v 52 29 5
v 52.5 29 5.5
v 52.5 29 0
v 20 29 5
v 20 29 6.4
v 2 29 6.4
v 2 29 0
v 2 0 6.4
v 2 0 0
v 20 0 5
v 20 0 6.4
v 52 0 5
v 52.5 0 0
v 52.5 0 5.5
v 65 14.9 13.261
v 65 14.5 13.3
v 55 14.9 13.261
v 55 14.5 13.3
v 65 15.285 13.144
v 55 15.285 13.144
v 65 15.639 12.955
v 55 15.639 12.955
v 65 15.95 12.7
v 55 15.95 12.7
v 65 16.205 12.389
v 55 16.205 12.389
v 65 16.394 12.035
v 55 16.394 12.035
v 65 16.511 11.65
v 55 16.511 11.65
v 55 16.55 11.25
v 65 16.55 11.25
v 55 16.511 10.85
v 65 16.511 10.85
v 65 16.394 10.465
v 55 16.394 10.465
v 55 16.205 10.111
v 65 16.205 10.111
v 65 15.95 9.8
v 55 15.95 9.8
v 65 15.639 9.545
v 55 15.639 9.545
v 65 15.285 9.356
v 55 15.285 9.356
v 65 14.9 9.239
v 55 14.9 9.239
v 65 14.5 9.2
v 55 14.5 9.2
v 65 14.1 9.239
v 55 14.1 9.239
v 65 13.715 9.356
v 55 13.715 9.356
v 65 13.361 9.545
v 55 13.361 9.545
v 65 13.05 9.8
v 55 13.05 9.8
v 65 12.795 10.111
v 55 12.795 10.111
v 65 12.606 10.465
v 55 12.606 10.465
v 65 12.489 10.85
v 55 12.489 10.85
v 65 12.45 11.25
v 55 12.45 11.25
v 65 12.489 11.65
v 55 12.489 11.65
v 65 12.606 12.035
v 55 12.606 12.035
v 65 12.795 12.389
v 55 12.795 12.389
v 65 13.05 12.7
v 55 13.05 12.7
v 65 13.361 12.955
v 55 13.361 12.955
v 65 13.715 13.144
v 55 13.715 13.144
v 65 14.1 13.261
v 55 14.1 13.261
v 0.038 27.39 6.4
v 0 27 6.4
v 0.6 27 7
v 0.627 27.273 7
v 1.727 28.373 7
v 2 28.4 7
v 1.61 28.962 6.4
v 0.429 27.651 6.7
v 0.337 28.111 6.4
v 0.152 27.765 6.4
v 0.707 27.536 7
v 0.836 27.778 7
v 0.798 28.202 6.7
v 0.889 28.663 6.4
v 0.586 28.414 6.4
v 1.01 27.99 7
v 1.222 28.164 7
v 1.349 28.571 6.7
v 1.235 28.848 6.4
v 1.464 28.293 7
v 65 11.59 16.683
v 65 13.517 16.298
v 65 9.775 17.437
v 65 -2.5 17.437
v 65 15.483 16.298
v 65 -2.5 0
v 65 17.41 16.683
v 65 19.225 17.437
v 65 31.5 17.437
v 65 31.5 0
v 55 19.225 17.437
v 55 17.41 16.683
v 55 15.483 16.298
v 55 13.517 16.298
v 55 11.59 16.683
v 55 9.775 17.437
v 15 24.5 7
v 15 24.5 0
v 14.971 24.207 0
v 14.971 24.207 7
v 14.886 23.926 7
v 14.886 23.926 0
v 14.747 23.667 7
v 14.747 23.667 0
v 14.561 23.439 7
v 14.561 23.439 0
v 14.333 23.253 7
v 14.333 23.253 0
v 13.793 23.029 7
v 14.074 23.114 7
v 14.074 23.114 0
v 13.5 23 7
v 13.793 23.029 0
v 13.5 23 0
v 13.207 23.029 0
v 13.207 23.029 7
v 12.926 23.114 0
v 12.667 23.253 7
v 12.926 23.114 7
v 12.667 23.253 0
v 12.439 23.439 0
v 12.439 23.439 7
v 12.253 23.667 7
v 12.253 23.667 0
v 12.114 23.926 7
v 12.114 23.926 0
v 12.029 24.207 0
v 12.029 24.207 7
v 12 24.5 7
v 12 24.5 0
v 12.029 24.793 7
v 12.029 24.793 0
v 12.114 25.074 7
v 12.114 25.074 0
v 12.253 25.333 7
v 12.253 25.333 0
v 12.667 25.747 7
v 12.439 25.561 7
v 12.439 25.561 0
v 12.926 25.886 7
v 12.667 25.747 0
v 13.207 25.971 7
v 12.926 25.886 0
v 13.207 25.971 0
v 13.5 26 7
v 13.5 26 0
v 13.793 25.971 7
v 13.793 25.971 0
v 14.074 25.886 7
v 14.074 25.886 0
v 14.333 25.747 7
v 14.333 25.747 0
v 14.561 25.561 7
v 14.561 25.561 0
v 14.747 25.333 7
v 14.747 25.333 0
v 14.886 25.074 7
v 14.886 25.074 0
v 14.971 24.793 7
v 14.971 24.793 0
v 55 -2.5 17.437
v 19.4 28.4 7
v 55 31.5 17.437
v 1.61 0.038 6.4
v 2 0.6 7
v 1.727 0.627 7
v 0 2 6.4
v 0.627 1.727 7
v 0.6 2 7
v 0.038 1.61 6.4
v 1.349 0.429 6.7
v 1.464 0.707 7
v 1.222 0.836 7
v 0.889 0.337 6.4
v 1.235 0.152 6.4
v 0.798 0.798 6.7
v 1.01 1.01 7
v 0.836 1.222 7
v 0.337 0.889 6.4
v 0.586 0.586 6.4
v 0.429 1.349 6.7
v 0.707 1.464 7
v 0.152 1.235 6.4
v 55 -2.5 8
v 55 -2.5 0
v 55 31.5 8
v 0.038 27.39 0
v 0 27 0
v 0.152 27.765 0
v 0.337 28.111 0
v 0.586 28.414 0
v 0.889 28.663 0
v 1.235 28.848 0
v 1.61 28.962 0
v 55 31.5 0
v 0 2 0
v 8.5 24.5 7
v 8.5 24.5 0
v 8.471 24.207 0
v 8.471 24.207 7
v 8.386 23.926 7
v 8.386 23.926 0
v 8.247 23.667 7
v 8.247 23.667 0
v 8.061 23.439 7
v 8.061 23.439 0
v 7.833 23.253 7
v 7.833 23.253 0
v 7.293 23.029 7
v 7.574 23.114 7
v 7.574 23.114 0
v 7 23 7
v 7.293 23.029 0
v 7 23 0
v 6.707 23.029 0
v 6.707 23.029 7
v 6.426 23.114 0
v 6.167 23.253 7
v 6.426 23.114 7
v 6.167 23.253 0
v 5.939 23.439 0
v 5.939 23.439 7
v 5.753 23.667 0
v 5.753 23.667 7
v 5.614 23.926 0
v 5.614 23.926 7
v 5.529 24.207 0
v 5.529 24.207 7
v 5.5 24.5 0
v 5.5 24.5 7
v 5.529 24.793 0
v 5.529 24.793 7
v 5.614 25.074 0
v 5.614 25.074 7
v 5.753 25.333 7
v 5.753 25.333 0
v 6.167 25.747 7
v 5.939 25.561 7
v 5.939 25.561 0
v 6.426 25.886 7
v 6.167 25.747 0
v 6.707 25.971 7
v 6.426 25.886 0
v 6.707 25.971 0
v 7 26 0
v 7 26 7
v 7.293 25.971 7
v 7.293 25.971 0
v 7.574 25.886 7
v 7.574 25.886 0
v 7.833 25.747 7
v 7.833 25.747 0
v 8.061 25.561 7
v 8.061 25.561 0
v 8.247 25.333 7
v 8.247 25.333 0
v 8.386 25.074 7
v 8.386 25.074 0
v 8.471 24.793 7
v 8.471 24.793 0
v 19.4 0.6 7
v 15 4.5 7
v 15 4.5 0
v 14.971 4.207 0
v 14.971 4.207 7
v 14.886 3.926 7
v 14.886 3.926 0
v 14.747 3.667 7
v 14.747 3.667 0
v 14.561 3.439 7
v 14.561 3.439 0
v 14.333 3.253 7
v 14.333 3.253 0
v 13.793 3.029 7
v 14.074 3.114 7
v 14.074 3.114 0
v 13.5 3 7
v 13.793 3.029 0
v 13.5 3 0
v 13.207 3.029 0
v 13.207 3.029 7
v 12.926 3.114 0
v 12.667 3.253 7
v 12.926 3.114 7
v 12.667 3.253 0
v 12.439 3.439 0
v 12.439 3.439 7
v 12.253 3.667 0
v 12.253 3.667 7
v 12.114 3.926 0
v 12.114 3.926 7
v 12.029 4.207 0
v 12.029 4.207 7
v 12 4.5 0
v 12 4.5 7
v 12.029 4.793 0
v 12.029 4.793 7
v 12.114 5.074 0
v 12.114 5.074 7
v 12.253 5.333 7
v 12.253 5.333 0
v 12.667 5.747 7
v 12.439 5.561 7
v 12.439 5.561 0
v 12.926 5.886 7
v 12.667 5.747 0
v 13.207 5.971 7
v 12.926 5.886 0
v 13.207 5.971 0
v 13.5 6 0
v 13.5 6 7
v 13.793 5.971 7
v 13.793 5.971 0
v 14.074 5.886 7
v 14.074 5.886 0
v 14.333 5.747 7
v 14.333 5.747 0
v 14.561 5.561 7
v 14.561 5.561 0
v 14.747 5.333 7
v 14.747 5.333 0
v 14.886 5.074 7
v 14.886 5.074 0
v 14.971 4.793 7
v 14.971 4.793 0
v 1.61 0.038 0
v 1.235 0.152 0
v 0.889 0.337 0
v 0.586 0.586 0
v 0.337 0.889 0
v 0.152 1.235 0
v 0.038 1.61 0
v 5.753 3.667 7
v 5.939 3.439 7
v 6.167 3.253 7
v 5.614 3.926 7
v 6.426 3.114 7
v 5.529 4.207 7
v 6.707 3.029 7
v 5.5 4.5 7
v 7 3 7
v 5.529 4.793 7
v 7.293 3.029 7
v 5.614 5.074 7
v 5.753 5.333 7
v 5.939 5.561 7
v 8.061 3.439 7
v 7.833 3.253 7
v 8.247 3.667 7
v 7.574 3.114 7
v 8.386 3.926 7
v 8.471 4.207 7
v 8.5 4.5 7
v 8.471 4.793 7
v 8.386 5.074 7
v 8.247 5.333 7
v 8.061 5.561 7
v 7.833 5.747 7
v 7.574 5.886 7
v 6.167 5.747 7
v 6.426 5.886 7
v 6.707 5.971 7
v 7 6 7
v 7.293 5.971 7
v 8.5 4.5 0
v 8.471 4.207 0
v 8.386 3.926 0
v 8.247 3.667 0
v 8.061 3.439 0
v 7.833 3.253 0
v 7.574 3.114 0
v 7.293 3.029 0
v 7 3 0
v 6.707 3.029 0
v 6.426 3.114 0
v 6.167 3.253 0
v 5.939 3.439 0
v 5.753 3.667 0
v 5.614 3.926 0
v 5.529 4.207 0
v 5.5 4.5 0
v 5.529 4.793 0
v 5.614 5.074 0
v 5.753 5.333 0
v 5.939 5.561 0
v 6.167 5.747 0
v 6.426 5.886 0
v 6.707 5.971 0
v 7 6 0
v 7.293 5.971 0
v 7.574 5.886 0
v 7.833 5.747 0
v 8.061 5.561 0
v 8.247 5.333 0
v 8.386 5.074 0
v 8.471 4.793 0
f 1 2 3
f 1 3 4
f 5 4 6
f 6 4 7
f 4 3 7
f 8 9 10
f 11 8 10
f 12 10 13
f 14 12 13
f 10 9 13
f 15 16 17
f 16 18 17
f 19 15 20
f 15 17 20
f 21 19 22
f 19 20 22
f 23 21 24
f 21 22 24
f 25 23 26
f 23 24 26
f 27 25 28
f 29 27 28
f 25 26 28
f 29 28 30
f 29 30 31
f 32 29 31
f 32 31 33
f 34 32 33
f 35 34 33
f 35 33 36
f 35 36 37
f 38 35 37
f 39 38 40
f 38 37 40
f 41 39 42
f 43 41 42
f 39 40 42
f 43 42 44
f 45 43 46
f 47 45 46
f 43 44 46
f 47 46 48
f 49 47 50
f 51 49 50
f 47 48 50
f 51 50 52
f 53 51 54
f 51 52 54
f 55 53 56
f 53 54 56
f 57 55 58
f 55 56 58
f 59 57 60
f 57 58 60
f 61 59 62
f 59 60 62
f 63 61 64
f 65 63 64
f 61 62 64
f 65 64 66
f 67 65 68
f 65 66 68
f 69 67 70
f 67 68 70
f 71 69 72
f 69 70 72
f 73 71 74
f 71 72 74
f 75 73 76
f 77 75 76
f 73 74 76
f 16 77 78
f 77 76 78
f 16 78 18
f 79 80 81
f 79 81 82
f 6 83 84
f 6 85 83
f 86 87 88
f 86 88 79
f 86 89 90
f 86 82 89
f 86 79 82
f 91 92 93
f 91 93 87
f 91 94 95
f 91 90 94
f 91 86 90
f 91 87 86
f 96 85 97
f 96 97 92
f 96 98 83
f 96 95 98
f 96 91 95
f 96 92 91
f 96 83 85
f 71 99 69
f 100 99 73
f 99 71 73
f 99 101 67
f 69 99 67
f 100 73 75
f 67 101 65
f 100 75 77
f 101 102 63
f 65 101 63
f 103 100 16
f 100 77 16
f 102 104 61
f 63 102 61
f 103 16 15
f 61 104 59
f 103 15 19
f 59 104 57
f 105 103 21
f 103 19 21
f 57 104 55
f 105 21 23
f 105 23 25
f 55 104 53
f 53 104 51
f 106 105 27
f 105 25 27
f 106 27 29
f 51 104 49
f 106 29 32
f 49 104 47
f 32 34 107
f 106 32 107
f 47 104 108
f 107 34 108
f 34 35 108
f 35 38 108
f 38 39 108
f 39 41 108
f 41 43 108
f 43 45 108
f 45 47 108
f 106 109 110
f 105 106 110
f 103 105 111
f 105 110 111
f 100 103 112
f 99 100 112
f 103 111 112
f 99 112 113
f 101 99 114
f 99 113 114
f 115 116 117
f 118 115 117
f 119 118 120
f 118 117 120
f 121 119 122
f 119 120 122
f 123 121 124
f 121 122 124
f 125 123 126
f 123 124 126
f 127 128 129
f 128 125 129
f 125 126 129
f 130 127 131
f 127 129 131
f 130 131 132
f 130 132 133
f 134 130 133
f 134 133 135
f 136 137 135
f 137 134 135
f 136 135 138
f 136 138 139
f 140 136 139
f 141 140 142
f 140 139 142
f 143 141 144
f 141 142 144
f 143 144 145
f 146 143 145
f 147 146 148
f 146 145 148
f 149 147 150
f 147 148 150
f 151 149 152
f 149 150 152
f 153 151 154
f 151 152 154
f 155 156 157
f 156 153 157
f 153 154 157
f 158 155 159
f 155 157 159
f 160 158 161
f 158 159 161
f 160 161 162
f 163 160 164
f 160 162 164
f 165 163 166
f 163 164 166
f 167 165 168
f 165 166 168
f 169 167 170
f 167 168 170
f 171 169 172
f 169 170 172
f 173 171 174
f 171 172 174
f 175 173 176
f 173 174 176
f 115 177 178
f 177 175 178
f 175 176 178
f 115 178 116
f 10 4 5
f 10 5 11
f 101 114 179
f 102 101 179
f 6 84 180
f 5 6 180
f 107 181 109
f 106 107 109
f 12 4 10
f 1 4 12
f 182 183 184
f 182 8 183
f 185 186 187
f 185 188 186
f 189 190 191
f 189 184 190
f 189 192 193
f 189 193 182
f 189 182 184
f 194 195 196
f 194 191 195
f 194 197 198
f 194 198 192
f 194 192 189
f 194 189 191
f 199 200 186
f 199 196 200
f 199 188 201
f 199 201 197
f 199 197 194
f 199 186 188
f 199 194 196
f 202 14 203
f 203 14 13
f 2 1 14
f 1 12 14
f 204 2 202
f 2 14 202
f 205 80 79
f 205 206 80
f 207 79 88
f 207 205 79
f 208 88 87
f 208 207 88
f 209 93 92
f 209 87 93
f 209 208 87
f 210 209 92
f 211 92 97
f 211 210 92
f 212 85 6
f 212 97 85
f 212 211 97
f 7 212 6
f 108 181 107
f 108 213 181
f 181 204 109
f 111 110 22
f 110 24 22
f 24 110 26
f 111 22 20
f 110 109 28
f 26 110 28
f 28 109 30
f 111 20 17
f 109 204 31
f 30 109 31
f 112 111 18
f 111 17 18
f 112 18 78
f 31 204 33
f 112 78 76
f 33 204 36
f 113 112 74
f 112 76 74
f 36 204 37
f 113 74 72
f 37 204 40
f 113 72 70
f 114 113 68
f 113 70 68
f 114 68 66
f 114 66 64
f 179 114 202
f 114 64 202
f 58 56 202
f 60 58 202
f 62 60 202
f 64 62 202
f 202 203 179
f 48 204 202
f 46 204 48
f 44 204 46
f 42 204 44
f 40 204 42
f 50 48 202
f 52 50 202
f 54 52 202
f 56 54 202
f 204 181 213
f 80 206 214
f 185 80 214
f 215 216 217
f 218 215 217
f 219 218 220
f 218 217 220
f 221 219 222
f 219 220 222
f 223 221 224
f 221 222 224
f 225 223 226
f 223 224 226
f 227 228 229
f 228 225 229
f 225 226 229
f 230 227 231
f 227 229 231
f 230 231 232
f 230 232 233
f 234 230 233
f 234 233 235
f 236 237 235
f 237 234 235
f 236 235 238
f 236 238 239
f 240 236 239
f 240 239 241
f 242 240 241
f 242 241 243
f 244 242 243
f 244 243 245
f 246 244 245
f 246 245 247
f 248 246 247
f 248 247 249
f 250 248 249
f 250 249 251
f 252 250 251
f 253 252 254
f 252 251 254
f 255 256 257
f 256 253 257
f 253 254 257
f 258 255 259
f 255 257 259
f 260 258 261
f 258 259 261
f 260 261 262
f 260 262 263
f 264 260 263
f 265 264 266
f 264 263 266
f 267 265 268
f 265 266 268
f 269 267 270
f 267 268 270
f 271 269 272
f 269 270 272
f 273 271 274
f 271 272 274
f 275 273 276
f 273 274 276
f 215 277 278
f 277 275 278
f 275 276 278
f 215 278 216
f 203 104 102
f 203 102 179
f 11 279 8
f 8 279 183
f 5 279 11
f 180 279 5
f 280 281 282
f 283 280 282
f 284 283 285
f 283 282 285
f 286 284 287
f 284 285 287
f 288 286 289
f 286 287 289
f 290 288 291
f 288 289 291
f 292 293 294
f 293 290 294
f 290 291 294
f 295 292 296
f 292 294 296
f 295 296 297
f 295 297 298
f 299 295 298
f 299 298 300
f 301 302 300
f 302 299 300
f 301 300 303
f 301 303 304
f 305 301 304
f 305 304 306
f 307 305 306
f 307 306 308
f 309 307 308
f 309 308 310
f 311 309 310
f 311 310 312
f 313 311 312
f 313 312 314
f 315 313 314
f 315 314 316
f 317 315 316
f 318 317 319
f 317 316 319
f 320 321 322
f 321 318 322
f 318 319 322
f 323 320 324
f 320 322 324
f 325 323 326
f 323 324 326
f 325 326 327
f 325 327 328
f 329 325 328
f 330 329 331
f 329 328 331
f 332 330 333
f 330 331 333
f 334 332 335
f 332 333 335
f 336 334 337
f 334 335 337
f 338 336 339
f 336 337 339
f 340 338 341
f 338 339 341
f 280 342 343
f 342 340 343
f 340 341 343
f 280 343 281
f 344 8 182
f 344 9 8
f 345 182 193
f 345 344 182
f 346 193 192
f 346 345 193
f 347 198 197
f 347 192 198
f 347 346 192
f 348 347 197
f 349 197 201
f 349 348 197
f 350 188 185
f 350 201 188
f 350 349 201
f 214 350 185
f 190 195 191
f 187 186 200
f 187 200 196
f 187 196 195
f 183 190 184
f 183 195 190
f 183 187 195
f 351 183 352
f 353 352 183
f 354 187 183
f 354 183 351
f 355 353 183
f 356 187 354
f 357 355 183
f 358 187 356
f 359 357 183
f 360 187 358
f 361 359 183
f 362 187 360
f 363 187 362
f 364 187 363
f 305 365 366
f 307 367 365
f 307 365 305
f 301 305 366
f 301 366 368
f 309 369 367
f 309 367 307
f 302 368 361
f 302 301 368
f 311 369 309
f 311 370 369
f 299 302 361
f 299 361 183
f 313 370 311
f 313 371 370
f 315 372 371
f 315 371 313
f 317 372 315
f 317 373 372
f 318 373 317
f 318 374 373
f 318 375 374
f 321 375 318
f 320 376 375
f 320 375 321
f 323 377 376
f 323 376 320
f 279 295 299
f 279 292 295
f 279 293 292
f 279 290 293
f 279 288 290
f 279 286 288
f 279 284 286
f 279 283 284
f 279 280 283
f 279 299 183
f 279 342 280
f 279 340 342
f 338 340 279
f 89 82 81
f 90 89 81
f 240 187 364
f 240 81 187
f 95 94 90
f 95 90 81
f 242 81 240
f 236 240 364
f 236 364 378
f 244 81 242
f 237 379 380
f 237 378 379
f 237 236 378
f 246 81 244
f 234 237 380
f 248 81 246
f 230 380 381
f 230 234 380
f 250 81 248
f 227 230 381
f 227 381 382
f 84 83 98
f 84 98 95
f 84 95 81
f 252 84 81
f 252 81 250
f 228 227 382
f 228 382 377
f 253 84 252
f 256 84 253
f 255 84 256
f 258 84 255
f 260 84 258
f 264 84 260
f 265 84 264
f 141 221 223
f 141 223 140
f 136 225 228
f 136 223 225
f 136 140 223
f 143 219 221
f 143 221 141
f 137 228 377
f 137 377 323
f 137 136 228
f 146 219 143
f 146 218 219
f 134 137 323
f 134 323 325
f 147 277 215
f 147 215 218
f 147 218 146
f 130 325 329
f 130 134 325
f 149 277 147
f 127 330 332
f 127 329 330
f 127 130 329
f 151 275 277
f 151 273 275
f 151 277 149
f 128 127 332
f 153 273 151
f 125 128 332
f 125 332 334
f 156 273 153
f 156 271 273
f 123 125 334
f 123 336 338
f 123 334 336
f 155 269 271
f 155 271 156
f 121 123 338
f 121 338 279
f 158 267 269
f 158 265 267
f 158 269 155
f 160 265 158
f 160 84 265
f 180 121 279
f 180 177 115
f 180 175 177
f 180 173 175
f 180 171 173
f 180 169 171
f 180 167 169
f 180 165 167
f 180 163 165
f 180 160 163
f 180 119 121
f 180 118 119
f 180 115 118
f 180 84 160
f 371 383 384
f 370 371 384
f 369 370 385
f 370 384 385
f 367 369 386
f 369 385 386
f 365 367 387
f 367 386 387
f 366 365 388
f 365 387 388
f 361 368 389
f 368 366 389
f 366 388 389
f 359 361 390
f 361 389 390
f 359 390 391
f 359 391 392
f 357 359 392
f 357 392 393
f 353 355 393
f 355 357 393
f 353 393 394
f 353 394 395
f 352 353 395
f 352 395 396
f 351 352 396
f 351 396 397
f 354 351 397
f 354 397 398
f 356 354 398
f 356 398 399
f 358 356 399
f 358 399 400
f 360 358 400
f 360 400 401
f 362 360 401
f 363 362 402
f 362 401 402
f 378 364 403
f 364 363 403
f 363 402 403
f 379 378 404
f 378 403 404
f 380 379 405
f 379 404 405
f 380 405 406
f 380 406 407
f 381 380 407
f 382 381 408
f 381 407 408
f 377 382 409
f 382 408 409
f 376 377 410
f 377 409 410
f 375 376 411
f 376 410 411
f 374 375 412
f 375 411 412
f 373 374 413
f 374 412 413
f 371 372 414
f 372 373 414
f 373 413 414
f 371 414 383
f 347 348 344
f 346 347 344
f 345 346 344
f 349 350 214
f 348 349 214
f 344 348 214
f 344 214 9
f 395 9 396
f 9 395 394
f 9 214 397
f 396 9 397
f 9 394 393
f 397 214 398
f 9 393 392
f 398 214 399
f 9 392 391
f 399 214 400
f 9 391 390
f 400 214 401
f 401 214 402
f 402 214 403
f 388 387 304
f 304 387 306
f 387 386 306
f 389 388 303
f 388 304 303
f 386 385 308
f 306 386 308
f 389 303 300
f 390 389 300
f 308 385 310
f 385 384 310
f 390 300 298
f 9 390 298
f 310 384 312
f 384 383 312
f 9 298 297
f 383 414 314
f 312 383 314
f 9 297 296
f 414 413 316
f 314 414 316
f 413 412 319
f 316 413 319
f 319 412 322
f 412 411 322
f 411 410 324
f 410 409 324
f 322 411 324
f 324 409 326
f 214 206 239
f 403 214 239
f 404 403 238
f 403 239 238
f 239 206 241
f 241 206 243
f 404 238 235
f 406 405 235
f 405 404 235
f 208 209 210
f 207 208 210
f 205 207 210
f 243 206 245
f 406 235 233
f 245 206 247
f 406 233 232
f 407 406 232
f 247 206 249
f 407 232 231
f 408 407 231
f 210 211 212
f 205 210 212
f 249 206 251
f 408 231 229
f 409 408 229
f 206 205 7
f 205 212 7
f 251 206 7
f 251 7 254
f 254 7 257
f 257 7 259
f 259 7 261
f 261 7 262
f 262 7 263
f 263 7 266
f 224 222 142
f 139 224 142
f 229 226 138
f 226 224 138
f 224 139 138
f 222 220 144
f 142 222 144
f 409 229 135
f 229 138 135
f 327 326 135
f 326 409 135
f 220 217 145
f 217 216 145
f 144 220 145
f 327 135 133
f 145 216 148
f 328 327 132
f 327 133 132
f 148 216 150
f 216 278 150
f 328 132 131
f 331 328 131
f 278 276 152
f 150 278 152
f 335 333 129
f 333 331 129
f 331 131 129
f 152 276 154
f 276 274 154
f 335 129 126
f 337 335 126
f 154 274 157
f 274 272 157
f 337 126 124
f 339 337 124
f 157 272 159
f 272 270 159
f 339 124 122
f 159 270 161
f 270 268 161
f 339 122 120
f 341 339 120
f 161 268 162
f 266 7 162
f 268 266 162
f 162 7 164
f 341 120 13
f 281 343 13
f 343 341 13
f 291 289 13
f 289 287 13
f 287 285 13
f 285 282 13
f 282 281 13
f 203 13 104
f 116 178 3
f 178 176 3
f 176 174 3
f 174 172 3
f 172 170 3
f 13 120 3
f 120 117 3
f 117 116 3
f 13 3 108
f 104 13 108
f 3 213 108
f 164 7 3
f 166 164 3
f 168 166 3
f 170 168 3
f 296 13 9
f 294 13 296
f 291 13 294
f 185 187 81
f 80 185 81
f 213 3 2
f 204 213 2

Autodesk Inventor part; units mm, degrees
ref_plane "YZ Plane" through (0, 0, 0) normal (1, 0, 0) x (0, 1, 0)
ref_plane "XZ Plane" through (0, 0, 0) normal (0, 1, 0) x (-1, 0, 0)
ref_plane "XY Plane" through (0, 0, 0) normal (0, 0, 1) x (1, 0, 0)
sketch "Sketch1" plane through (0, 0, 0) normal (0, 0, 1) x (1, 0, 0)
  line L0 (2, 0) -> (65, 0)
  line L1 (65, 0) -> (65, 29)
  line L2 (65, 29) -> (2, 29)
  line L3 (0, 27) -> (0, 2)
  arc A0 (2, 29) -> (0, 27) centre (2, 27) ccw
  arc A1 (0, 2) -> (2, 0) centre (2, 2) ccw
  line L4 (20, 29) -> (20, 0)
  line L5 (55, 29) -> (55, 0)
  circle A2 centre (7, 24.5) radius 1.5
  circle A3 centre (7, 4.5) radius 1.5
  circle A4 centre (13.5, 24.5) radius 1.5
  circle A5 centre (13.5, 4.5) radius 1.5
  line L6 (65, 0) -> (65, -2.5)
  line L7 (65, -2.5) -> (55, -2.5)
  line L8 (55, -2.5) -> (55, 0)
  line L9 (55, 29) -> (55, 31.5)
  line L10 (55, 31.5) -> (65, 31.5)
  line L11 (65, 31.5) -> (65, 29)
  point P0 (0, 0)
  point P1 (0, 29)
  dimension "d0" = 65
  dimension "d1" = 29
  dimension "d2" = 2
  dimension "d3" = 20
  dimension "d4" = 10
  dimension "d5" = 3
  dimension "d6" = 3
  dimension "d7" = 4.5
  dimension "d8" = 4.5
  dimension "d9" = 20
  dimension "d10" = 3
  dimension "d11" = 3
  dimension "d12" = 20
  dimension "d13" = 6.5
  dimension "d14" = 7
  dimension "d24" = 2.5
  dimension "d25" = 2.5
extrude "Extrusion1" add sketch "Sketch1" along normal blind 5 contours L4 L2 L5 L0
extrude "Extrusion2" add sketch "Sketch1" along normal blind 7 contours A1 L3 A0 L2 L4 L0
extrude "Extrusion3" add sketch "Sketch1" along normal blind 26.25 contours L5 L2 L1 L0
sketch "Sketch2" plane through (55, 0, 5) normal (-1, 0, 0) x (0, 0, 1)
  line L0 (21.25, 29) -> (21.25, 0) projected
  circle A0 centre (21.25, 14.5) radius 10
  point P0 (-5, 0)
  point P1 (21.25, 4.5)
  point P2 (21.25, 24.5)
  dimension "d21" = 20
extrude "Extrusion4" cut sketch "Sketch2" against normal blind 20 contours L0 A0 picked at (15.0351, 13.318)
extrude "Extrusion5" add sketch "Sketch1" along normal blind 26.25 contours L0 L6 L7 L8 | L9 L10 L11 L2
chamfer "Chamfer1" distance 2.5 angle 45 1 edges at (55, 0, 2.5)
chamfer "Chamfer2" distance 2.5 angle 45 1 edges at (55, 29, 2.5)
chamfer "Chamfer4" distance 0.6 angle 45 6 edges at (20, 14.5, 7) (11, 0, 7) (0.5858, 0.5858, 7) (0, 14.5, 7) (0.5858, 28.4142, 7) (11, 29, 7)
sketch "Sketch5" plane through (55, 14.5, 26.25) normal (-1, 0, 0) x (0, 0, 1)
  circle A0 centre (-15, 0) radius 2.05
  line L0 (0, -10) -> (0, -17) projected
  point P0 (-26.25, -14.5)
  dimension "d48" = 4.1
  dimension "d49" = 15
extrude "Extrusion7" cut sketch "Sketch5" against normal blind 26.25
extrude "Extrusion8" cut sketch "Sketch5" along normal blind 26.25
sketch "Sketch6" plane through (55, 14.5, 26.25) normal (-1, 0, 0) x (0, 0, 1)
  line L0 (0, 17) -> (0, 10) projected
  line L1 (-21.25, -17) -> (0, -17) projected
  line L2 (0, 17) -> (-8.8131, 17)
  line L3 (-8.8131, 17) -> (-8.8131, -17)
  line L4 (-8.8131, -17) -> (0, -17)
  line L5 (0, -17) -> (0, 17)
  point P0 (-26.25, -14.5)
  point P1 (-15.25, -17)
extrude "Extrusion9" cut sketch "Sketch6" against normal blind 26.25
chamfer "Chamfer5" distance 3 angle 45 1 edges at (55, 14.5, 5)
equation "\"BendRadius\" = Thickness"
equation "\"BendReliefWidth\" = Thickness"
equation "\"BendReliefDepth\" = 0.5 * Thickness"
equation "\"CornerReliefSize\" = 4 * Thickness"
equation "\"MinimumRemnant\" = 2 * Thickness"
equation "\"TransitionRadius\" = BendRadius"
equation "\"JacobiRadiusSize\" = BendRadius"
equation "\"GapSize\" = Thickness"
equation "\"Thickness\" = 0.5"
properties part number "tool4_2"
